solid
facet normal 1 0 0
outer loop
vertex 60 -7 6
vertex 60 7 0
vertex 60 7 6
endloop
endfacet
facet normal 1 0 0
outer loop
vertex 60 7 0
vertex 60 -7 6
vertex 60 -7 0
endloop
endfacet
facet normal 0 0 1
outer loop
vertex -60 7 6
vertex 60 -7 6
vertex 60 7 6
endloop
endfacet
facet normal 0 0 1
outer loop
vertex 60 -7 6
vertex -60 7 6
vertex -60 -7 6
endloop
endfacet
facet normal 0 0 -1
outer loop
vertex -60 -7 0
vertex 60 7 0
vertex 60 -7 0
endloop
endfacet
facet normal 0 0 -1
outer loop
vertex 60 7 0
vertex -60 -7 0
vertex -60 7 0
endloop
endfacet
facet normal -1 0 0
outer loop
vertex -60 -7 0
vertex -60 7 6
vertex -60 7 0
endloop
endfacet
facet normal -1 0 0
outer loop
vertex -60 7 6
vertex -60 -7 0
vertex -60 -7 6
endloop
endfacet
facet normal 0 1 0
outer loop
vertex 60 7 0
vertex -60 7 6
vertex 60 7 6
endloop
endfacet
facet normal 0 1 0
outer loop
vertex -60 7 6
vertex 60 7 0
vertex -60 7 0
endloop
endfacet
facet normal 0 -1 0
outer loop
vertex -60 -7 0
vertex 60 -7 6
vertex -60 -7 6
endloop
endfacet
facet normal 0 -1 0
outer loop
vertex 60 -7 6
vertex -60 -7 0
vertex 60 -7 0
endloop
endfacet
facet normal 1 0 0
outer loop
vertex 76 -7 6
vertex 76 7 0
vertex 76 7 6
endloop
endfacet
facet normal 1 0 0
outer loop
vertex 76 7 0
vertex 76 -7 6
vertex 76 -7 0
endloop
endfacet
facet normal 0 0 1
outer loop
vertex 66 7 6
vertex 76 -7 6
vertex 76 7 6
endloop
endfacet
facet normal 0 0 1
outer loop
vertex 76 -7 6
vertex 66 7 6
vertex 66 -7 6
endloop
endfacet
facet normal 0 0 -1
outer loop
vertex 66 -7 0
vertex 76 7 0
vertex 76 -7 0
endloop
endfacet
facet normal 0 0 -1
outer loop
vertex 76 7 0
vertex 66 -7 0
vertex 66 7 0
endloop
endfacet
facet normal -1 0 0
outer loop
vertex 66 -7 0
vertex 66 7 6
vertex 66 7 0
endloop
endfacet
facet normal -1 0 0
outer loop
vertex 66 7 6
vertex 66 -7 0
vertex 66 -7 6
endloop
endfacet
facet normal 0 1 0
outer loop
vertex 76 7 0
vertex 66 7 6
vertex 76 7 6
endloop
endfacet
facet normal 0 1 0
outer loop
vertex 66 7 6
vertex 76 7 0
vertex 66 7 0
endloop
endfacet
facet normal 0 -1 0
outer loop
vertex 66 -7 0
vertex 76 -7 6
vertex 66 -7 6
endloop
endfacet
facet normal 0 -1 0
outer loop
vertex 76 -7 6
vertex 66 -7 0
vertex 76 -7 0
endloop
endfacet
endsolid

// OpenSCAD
// file: ../../dsg/openscad/components/mounting-plate/mounting_plate.scad
// File: mounting_plate.scad
//   Project-specific mounting plate used by the reference assembly.
//
// FileSummary: Simple rectangular mounting surface.
//
// Module: mounting_plate()
// Usage:
//   mounting_plate();
// Description:
//   Creates the mounting plate centered in X/Y with its base at Z=0.
// Arguments:
//   width = Overall X dimension.
//   height = Overall Y dimension.
//   thickness = Plate thickness.
MOUNTING_PLATE_WIDTH = 120;
MOUNTING_PLATE_HEIGHT = 70;
MOUNTING_PLATE_THICKNESS = 6;


// Function: mounting_plate_thickness()
// Usage:
//   thickness = mounting_plate_thickness();
// Description:
//   Returns the default mounting plate thickness for consumers that import
//   this file with `use`.
function mounting_plate_thickness() = MOUNTING_PLATE_THICKNESS;

module mounting_plate(
    width = MOUNTING_PLATE_WIDTH,
    height = MOUNTING_PLATE_HEIGHT,
    thickness = MOUNTING_PLATE_THICKNESS
) {
    translate([-width / 2, -height / 2, 0])
        cube([width, height, thickness]);
}

// Module: mounting_plate_design()
// Usage:
//   mounting_plate_design("base");
//   mounting_plate_design("final");
// Description:
//   Documentation-oriented views for the mounting plate.
// Arguments:
//   view = Named design-documentation view.
module mounting_plate_design(view = "final") {
    if (view == "base")
        color([1, 0, 0, 0.55]) mounting_plate();
    else
        mounting_plate();
}
// main file
// File: mounting_plate_thickness_check.scad
// Verification-only view of the reference mounting plate thickness.

use <../../dsg/openscad/components/mounting-plate/mounting_plate.scad>

$fn = 48;

// Keep a narrow center strip so the Z thickness is easy to inspect.
color([0.85, 0.12, 0.12])
    intersection() {
        mounting_plate();
        translate([-70, -7, -1])
            cube([140, 14, mounting_plate_thickness() + 2]);
    }

// Separate reference gauge with exactly the configured plate thickness.
color([0.75, 0.75, 0.75, 0.55])
    translate([66, -7, 0])
        cube([10, 14, mounting_plate_thickness()]);
